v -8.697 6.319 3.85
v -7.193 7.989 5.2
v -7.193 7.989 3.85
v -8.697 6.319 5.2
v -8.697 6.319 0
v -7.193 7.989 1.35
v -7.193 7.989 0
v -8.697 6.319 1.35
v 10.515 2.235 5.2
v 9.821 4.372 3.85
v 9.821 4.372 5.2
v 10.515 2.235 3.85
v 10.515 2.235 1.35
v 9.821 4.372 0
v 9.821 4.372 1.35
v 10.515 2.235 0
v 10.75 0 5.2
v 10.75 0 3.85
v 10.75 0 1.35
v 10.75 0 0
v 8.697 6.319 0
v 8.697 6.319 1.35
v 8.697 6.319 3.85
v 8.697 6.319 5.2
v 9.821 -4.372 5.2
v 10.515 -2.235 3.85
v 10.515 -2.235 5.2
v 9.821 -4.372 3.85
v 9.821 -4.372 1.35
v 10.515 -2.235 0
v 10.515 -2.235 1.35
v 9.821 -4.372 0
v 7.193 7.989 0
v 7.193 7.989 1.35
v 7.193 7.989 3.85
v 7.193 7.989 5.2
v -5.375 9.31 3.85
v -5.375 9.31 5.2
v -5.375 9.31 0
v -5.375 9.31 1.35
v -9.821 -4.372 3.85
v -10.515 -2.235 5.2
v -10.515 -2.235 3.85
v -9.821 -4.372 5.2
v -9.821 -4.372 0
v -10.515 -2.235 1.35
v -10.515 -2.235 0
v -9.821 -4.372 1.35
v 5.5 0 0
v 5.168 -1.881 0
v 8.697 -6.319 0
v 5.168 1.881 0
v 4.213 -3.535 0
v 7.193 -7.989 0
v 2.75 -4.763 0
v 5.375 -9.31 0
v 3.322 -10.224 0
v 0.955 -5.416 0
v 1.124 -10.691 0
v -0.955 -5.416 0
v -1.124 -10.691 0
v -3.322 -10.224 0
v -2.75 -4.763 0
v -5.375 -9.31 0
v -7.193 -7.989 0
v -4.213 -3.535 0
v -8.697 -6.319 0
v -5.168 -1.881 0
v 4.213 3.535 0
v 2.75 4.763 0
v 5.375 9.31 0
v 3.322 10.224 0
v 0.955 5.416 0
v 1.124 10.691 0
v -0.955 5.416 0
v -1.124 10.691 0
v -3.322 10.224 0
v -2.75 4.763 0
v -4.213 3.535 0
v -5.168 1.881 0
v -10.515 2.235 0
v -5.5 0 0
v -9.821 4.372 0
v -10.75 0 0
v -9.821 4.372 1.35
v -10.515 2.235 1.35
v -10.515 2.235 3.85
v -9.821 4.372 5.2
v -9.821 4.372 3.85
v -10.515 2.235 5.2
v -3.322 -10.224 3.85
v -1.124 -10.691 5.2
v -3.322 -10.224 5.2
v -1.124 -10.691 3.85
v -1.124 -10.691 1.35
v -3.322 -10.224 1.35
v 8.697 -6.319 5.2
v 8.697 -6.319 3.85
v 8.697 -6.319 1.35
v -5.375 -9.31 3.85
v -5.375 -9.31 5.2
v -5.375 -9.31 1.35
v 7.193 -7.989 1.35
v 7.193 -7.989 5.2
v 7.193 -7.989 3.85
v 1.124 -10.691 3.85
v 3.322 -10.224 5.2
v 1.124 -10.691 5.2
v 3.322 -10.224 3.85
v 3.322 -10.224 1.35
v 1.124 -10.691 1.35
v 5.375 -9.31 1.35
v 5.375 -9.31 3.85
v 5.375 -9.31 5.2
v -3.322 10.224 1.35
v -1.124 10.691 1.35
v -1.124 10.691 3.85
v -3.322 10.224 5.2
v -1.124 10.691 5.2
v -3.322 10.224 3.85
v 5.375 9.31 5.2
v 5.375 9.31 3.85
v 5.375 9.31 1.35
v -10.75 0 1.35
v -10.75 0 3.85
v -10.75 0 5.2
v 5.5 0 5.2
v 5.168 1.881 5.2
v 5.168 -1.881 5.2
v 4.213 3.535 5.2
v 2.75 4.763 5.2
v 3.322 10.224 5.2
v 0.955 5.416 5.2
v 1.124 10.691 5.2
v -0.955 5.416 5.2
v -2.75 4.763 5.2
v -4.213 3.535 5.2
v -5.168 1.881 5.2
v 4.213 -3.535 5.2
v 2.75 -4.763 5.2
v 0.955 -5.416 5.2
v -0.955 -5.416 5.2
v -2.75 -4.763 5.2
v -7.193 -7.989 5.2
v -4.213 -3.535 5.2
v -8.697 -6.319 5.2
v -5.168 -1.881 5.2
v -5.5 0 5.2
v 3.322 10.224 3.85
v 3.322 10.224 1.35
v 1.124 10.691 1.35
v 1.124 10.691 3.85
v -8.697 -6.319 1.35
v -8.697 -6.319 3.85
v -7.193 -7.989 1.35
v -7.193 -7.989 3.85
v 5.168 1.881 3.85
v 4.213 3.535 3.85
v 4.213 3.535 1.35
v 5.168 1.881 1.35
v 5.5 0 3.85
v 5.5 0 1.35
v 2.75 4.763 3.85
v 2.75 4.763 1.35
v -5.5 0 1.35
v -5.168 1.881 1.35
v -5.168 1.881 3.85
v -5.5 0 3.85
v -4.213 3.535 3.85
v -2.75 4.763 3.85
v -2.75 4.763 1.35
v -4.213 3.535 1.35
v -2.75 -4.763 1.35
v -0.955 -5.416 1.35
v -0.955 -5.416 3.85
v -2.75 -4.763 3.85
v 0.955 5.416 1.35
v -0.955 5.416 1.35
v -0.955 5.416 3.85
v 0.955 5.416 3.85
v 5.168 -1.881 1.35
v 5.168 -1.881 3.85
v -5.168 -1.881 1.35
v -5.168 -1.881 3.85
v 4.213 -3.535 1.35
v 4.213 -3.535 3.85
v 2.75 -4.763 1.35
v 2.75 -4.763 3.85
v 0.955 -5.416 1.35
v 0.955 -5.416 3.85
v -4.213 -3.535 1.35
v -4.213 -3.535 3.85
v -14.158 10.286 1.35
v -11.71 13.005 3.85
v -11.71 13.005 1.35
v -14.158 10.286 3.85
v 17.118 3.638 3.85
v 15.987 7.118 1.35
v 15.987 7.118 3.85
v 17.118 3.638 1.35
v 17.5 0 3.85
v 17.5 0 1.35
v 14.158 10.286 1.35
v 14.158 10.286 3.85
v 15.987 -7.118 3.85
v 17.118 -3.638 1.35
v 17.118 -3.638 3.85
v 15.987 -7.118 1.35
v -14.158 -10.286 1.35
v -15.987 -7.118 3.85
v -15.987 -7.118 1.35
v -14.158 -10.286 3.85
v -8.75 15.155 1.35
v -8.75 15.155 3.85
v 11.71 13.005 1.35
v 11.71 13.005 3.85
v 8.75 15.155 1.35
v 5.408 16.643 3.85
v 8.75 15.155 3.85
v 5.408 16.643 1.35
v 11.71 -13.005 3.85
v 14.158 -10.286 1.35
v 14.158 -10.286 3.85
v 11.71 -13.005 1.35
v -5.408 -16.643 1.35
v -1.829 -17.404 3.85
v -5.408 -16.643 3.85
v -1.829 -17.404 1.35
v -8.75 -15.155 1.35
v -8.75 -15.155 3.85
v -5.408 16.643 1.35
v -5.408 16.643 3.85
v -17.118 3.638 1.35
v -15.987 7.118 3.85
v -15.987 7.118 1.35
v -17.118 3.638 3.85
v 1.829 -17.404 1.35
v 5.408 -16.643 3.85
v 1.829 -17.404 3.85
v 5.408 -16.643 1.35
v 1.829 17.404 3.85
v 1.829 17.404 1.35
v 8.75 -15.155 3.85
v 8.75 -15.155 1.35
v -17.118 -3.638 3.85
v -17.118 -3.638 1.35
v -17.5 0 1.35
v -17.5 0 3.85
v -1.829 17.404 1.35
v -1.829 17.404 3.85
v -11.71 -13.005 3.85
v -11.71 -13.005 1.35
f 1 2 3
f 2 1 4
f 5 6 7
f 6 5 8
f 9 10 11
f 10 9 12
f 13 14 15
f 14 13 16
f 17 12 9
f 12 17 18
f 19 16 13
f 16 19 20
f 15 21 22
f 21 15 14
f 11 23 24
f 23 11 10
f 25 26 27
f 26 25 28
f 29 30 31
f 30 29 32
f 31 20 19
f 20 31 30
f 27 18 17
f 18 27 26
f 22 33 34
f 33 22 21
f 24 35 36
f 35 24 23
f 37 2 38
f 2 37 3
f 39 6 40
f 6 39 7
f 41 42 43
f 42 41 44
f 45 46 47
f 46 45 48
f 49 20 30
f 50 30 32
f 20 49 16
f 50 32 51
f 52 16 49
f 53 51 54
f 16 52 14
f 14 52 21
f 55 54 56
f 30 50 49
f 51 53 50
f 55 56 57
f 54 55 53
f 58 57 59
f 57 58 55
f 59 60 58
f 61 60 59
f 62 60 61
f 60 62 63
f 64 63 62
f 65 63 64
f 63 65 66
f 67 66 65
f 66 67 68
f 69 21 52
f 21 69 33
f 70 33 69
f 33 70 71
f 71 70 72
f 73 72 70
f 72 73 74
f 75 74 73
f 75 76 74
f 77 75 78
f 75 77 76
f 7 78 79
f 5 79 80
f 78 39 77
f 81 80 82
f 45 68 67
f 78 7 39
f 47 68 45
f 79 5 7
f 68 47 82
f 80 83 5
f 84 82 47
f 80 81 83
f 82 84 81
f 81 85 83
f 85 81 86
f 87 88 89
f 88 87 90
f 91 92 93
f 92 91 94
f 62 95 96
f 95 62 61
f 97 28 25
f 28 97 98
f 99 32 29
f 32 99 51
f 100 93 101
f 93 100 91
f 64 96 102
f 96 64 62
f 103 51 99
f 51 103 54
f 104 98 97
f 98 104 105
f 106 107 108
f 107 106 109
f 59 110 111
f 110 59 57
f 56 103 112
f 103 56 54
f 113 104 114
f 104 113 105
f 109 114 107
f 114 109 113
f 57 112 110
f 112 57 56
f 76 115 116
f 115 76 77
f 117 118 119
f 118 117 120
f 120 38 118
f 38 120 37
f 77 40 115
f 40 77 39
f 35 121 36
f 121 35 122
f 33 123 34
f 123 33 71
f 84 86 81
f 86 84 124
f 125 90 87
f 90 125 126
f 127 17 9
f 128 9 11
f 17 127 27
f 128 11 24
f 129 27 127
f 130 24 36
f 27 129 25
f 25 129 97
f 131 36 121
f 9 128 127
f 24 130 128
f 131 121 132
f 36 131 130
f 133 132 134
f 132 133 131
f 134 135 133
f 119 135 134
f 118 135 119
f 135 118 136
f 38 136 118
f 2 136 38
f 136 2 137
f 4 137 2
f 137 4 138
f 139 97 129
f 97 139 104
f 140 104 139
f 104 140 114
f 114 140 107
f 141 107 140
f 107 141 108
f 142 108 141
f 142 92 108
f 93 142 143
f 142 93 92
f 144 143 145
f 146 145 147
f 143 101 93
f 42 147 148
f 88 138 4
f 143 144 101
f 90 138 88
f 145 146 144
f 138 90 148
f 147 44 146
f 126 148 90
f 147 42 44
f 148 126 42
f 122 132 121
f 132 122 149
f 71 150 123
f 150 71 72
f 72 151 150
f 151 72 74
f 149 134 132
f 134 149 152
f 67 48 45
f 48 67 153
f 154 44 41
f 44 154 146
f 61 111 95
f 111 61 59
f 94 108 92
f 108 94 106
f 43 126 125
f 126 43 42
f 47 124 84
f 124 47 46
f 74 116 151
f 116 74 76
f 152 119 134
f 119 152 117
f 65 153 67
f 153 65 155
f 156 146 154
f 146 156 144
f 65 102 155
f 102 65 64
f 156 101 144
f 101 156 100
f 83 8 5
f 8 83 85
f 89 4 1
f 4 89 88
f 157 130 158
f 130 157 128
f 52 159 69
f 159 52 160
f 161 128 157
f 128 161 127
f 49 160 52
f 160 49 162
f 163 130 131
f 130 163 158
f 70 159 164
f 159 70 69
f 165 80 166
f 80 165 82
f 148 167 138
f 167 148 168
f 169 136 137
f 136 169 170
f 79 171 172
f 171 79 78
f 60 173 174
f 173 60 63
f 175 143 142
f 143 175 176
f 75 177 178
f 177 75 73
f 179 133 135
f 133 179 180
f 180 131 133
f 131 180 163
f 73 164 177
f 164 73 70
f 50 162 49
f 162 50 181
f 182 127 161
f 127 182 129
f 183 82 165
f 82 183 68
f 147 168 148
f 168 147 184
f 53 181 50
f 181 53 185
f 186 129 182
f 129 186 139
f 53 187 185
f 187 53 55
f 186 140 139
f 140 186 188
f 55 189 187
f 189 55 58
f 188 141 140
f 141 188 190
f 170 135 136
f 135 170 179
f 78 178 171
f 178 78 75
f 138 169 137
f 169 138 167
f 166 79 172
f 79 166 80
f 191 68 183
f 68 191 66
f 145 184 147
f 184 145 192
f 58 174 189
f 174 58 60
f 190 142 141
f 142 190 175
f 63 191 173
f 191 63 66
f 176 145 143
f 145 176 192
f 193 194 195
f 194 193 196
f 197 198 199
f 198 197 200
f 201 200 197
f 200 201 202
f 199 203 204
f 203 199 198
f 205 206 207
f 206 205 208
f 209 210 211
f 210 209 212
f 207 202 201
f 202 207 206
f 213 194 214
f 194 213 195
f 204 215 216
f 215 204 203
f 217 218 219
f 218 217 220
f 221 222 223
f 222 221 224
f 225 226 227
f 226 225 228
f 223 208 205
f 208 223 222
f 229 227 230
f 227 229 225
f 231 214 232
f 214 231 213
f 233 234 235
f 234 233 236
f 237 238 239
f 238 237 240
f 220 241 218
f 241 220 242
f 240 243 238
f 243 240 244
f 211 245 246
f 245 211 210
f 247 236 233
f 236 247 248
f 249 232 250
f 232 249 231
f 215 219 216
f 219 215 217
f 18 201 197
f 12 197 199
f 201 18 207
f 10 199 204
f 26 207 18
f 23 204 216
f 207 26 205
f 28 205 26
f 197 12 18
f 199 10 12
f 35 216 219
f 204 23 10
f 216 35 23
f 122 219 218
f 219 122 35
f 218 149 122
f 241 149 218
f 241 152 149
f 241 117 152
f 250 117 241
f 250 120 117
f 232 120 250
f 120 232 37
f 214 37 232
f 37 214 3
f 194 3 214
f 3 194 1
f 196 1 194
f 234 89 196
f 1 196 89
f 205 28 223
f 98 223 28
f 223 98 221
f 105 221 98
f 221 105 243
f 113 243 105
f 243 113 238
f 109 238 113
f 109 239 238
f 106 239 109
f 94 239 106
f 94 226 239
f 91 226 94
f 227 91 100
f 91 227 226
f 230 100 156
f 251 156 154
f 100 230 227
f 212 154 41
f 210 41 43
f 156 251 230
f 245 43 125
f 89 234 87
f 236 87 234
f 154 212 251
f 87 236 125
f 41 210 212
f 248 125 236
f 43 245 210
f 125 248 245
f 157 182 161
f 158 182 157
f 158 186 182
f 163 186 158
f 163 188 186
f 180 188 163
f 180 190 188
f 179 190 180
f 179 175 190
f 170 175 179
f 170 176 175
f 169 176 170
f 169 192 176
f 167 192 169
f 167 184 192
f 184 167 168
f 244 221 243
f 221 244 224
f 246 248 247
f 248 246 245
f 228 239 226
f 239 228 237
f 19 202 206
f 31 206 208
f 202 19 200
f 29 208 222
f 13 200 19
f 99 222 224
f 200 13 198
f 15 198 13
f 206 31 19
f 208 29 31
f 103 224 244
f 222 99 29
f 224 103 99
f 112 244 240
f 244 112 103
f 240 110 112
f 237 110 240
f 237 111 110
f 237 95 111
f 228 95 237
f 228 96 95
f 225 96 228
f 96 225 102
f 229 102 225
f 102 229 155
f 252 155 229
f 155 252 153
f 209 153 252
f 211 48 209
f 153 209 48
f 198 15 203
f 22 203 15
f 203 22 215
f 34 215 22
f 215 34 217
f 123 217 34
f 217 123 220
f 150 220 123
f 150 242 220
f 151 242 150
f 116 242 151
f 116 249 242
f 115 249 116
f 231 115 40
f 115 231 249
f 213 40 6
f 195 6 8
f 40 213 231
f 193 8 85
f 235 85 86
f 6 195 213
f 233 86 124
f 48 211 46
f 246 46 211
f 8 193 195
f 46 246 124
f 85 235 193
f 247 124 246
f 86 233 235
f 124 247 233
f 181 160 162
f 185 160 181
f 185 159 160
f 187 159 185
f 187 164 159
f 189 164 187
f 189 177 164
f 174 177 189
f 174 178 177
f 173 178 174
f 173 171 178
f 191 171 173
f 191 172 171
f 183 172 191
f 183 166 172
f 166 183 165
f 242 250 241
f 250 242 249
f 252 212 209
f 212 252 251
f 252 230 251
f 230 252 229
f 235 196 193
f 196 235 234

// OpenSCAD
// [FL_INDEX: keywords="openscad, 3d_parametric, Botsauto_munt_of_jeton_of_penning__bumper_car_coin, csg_solid" | COT="Parametric OpenSCAD design from 3DCodeverse"]
// Title: Botsauto munt of jeton of penning (bumper car coin)

// diameter of the coin ("pancake")
A=35.0;

// outer diameter of the ring
B=21.5;

// inner diameter of the ring
C=11.0;

// thickness of the "pancake"
D=2.5;

// total thickness of the coin, including rings
E=5.2;

union() {

	difference() {
		cylinder( h = E, r = B/2 );
		cylinder( h = E, r = C/2 );
	}
	
	translate( [ 0, 0, E/2 ] ) cylinder( h = D, r = A/2, center = true );

}
